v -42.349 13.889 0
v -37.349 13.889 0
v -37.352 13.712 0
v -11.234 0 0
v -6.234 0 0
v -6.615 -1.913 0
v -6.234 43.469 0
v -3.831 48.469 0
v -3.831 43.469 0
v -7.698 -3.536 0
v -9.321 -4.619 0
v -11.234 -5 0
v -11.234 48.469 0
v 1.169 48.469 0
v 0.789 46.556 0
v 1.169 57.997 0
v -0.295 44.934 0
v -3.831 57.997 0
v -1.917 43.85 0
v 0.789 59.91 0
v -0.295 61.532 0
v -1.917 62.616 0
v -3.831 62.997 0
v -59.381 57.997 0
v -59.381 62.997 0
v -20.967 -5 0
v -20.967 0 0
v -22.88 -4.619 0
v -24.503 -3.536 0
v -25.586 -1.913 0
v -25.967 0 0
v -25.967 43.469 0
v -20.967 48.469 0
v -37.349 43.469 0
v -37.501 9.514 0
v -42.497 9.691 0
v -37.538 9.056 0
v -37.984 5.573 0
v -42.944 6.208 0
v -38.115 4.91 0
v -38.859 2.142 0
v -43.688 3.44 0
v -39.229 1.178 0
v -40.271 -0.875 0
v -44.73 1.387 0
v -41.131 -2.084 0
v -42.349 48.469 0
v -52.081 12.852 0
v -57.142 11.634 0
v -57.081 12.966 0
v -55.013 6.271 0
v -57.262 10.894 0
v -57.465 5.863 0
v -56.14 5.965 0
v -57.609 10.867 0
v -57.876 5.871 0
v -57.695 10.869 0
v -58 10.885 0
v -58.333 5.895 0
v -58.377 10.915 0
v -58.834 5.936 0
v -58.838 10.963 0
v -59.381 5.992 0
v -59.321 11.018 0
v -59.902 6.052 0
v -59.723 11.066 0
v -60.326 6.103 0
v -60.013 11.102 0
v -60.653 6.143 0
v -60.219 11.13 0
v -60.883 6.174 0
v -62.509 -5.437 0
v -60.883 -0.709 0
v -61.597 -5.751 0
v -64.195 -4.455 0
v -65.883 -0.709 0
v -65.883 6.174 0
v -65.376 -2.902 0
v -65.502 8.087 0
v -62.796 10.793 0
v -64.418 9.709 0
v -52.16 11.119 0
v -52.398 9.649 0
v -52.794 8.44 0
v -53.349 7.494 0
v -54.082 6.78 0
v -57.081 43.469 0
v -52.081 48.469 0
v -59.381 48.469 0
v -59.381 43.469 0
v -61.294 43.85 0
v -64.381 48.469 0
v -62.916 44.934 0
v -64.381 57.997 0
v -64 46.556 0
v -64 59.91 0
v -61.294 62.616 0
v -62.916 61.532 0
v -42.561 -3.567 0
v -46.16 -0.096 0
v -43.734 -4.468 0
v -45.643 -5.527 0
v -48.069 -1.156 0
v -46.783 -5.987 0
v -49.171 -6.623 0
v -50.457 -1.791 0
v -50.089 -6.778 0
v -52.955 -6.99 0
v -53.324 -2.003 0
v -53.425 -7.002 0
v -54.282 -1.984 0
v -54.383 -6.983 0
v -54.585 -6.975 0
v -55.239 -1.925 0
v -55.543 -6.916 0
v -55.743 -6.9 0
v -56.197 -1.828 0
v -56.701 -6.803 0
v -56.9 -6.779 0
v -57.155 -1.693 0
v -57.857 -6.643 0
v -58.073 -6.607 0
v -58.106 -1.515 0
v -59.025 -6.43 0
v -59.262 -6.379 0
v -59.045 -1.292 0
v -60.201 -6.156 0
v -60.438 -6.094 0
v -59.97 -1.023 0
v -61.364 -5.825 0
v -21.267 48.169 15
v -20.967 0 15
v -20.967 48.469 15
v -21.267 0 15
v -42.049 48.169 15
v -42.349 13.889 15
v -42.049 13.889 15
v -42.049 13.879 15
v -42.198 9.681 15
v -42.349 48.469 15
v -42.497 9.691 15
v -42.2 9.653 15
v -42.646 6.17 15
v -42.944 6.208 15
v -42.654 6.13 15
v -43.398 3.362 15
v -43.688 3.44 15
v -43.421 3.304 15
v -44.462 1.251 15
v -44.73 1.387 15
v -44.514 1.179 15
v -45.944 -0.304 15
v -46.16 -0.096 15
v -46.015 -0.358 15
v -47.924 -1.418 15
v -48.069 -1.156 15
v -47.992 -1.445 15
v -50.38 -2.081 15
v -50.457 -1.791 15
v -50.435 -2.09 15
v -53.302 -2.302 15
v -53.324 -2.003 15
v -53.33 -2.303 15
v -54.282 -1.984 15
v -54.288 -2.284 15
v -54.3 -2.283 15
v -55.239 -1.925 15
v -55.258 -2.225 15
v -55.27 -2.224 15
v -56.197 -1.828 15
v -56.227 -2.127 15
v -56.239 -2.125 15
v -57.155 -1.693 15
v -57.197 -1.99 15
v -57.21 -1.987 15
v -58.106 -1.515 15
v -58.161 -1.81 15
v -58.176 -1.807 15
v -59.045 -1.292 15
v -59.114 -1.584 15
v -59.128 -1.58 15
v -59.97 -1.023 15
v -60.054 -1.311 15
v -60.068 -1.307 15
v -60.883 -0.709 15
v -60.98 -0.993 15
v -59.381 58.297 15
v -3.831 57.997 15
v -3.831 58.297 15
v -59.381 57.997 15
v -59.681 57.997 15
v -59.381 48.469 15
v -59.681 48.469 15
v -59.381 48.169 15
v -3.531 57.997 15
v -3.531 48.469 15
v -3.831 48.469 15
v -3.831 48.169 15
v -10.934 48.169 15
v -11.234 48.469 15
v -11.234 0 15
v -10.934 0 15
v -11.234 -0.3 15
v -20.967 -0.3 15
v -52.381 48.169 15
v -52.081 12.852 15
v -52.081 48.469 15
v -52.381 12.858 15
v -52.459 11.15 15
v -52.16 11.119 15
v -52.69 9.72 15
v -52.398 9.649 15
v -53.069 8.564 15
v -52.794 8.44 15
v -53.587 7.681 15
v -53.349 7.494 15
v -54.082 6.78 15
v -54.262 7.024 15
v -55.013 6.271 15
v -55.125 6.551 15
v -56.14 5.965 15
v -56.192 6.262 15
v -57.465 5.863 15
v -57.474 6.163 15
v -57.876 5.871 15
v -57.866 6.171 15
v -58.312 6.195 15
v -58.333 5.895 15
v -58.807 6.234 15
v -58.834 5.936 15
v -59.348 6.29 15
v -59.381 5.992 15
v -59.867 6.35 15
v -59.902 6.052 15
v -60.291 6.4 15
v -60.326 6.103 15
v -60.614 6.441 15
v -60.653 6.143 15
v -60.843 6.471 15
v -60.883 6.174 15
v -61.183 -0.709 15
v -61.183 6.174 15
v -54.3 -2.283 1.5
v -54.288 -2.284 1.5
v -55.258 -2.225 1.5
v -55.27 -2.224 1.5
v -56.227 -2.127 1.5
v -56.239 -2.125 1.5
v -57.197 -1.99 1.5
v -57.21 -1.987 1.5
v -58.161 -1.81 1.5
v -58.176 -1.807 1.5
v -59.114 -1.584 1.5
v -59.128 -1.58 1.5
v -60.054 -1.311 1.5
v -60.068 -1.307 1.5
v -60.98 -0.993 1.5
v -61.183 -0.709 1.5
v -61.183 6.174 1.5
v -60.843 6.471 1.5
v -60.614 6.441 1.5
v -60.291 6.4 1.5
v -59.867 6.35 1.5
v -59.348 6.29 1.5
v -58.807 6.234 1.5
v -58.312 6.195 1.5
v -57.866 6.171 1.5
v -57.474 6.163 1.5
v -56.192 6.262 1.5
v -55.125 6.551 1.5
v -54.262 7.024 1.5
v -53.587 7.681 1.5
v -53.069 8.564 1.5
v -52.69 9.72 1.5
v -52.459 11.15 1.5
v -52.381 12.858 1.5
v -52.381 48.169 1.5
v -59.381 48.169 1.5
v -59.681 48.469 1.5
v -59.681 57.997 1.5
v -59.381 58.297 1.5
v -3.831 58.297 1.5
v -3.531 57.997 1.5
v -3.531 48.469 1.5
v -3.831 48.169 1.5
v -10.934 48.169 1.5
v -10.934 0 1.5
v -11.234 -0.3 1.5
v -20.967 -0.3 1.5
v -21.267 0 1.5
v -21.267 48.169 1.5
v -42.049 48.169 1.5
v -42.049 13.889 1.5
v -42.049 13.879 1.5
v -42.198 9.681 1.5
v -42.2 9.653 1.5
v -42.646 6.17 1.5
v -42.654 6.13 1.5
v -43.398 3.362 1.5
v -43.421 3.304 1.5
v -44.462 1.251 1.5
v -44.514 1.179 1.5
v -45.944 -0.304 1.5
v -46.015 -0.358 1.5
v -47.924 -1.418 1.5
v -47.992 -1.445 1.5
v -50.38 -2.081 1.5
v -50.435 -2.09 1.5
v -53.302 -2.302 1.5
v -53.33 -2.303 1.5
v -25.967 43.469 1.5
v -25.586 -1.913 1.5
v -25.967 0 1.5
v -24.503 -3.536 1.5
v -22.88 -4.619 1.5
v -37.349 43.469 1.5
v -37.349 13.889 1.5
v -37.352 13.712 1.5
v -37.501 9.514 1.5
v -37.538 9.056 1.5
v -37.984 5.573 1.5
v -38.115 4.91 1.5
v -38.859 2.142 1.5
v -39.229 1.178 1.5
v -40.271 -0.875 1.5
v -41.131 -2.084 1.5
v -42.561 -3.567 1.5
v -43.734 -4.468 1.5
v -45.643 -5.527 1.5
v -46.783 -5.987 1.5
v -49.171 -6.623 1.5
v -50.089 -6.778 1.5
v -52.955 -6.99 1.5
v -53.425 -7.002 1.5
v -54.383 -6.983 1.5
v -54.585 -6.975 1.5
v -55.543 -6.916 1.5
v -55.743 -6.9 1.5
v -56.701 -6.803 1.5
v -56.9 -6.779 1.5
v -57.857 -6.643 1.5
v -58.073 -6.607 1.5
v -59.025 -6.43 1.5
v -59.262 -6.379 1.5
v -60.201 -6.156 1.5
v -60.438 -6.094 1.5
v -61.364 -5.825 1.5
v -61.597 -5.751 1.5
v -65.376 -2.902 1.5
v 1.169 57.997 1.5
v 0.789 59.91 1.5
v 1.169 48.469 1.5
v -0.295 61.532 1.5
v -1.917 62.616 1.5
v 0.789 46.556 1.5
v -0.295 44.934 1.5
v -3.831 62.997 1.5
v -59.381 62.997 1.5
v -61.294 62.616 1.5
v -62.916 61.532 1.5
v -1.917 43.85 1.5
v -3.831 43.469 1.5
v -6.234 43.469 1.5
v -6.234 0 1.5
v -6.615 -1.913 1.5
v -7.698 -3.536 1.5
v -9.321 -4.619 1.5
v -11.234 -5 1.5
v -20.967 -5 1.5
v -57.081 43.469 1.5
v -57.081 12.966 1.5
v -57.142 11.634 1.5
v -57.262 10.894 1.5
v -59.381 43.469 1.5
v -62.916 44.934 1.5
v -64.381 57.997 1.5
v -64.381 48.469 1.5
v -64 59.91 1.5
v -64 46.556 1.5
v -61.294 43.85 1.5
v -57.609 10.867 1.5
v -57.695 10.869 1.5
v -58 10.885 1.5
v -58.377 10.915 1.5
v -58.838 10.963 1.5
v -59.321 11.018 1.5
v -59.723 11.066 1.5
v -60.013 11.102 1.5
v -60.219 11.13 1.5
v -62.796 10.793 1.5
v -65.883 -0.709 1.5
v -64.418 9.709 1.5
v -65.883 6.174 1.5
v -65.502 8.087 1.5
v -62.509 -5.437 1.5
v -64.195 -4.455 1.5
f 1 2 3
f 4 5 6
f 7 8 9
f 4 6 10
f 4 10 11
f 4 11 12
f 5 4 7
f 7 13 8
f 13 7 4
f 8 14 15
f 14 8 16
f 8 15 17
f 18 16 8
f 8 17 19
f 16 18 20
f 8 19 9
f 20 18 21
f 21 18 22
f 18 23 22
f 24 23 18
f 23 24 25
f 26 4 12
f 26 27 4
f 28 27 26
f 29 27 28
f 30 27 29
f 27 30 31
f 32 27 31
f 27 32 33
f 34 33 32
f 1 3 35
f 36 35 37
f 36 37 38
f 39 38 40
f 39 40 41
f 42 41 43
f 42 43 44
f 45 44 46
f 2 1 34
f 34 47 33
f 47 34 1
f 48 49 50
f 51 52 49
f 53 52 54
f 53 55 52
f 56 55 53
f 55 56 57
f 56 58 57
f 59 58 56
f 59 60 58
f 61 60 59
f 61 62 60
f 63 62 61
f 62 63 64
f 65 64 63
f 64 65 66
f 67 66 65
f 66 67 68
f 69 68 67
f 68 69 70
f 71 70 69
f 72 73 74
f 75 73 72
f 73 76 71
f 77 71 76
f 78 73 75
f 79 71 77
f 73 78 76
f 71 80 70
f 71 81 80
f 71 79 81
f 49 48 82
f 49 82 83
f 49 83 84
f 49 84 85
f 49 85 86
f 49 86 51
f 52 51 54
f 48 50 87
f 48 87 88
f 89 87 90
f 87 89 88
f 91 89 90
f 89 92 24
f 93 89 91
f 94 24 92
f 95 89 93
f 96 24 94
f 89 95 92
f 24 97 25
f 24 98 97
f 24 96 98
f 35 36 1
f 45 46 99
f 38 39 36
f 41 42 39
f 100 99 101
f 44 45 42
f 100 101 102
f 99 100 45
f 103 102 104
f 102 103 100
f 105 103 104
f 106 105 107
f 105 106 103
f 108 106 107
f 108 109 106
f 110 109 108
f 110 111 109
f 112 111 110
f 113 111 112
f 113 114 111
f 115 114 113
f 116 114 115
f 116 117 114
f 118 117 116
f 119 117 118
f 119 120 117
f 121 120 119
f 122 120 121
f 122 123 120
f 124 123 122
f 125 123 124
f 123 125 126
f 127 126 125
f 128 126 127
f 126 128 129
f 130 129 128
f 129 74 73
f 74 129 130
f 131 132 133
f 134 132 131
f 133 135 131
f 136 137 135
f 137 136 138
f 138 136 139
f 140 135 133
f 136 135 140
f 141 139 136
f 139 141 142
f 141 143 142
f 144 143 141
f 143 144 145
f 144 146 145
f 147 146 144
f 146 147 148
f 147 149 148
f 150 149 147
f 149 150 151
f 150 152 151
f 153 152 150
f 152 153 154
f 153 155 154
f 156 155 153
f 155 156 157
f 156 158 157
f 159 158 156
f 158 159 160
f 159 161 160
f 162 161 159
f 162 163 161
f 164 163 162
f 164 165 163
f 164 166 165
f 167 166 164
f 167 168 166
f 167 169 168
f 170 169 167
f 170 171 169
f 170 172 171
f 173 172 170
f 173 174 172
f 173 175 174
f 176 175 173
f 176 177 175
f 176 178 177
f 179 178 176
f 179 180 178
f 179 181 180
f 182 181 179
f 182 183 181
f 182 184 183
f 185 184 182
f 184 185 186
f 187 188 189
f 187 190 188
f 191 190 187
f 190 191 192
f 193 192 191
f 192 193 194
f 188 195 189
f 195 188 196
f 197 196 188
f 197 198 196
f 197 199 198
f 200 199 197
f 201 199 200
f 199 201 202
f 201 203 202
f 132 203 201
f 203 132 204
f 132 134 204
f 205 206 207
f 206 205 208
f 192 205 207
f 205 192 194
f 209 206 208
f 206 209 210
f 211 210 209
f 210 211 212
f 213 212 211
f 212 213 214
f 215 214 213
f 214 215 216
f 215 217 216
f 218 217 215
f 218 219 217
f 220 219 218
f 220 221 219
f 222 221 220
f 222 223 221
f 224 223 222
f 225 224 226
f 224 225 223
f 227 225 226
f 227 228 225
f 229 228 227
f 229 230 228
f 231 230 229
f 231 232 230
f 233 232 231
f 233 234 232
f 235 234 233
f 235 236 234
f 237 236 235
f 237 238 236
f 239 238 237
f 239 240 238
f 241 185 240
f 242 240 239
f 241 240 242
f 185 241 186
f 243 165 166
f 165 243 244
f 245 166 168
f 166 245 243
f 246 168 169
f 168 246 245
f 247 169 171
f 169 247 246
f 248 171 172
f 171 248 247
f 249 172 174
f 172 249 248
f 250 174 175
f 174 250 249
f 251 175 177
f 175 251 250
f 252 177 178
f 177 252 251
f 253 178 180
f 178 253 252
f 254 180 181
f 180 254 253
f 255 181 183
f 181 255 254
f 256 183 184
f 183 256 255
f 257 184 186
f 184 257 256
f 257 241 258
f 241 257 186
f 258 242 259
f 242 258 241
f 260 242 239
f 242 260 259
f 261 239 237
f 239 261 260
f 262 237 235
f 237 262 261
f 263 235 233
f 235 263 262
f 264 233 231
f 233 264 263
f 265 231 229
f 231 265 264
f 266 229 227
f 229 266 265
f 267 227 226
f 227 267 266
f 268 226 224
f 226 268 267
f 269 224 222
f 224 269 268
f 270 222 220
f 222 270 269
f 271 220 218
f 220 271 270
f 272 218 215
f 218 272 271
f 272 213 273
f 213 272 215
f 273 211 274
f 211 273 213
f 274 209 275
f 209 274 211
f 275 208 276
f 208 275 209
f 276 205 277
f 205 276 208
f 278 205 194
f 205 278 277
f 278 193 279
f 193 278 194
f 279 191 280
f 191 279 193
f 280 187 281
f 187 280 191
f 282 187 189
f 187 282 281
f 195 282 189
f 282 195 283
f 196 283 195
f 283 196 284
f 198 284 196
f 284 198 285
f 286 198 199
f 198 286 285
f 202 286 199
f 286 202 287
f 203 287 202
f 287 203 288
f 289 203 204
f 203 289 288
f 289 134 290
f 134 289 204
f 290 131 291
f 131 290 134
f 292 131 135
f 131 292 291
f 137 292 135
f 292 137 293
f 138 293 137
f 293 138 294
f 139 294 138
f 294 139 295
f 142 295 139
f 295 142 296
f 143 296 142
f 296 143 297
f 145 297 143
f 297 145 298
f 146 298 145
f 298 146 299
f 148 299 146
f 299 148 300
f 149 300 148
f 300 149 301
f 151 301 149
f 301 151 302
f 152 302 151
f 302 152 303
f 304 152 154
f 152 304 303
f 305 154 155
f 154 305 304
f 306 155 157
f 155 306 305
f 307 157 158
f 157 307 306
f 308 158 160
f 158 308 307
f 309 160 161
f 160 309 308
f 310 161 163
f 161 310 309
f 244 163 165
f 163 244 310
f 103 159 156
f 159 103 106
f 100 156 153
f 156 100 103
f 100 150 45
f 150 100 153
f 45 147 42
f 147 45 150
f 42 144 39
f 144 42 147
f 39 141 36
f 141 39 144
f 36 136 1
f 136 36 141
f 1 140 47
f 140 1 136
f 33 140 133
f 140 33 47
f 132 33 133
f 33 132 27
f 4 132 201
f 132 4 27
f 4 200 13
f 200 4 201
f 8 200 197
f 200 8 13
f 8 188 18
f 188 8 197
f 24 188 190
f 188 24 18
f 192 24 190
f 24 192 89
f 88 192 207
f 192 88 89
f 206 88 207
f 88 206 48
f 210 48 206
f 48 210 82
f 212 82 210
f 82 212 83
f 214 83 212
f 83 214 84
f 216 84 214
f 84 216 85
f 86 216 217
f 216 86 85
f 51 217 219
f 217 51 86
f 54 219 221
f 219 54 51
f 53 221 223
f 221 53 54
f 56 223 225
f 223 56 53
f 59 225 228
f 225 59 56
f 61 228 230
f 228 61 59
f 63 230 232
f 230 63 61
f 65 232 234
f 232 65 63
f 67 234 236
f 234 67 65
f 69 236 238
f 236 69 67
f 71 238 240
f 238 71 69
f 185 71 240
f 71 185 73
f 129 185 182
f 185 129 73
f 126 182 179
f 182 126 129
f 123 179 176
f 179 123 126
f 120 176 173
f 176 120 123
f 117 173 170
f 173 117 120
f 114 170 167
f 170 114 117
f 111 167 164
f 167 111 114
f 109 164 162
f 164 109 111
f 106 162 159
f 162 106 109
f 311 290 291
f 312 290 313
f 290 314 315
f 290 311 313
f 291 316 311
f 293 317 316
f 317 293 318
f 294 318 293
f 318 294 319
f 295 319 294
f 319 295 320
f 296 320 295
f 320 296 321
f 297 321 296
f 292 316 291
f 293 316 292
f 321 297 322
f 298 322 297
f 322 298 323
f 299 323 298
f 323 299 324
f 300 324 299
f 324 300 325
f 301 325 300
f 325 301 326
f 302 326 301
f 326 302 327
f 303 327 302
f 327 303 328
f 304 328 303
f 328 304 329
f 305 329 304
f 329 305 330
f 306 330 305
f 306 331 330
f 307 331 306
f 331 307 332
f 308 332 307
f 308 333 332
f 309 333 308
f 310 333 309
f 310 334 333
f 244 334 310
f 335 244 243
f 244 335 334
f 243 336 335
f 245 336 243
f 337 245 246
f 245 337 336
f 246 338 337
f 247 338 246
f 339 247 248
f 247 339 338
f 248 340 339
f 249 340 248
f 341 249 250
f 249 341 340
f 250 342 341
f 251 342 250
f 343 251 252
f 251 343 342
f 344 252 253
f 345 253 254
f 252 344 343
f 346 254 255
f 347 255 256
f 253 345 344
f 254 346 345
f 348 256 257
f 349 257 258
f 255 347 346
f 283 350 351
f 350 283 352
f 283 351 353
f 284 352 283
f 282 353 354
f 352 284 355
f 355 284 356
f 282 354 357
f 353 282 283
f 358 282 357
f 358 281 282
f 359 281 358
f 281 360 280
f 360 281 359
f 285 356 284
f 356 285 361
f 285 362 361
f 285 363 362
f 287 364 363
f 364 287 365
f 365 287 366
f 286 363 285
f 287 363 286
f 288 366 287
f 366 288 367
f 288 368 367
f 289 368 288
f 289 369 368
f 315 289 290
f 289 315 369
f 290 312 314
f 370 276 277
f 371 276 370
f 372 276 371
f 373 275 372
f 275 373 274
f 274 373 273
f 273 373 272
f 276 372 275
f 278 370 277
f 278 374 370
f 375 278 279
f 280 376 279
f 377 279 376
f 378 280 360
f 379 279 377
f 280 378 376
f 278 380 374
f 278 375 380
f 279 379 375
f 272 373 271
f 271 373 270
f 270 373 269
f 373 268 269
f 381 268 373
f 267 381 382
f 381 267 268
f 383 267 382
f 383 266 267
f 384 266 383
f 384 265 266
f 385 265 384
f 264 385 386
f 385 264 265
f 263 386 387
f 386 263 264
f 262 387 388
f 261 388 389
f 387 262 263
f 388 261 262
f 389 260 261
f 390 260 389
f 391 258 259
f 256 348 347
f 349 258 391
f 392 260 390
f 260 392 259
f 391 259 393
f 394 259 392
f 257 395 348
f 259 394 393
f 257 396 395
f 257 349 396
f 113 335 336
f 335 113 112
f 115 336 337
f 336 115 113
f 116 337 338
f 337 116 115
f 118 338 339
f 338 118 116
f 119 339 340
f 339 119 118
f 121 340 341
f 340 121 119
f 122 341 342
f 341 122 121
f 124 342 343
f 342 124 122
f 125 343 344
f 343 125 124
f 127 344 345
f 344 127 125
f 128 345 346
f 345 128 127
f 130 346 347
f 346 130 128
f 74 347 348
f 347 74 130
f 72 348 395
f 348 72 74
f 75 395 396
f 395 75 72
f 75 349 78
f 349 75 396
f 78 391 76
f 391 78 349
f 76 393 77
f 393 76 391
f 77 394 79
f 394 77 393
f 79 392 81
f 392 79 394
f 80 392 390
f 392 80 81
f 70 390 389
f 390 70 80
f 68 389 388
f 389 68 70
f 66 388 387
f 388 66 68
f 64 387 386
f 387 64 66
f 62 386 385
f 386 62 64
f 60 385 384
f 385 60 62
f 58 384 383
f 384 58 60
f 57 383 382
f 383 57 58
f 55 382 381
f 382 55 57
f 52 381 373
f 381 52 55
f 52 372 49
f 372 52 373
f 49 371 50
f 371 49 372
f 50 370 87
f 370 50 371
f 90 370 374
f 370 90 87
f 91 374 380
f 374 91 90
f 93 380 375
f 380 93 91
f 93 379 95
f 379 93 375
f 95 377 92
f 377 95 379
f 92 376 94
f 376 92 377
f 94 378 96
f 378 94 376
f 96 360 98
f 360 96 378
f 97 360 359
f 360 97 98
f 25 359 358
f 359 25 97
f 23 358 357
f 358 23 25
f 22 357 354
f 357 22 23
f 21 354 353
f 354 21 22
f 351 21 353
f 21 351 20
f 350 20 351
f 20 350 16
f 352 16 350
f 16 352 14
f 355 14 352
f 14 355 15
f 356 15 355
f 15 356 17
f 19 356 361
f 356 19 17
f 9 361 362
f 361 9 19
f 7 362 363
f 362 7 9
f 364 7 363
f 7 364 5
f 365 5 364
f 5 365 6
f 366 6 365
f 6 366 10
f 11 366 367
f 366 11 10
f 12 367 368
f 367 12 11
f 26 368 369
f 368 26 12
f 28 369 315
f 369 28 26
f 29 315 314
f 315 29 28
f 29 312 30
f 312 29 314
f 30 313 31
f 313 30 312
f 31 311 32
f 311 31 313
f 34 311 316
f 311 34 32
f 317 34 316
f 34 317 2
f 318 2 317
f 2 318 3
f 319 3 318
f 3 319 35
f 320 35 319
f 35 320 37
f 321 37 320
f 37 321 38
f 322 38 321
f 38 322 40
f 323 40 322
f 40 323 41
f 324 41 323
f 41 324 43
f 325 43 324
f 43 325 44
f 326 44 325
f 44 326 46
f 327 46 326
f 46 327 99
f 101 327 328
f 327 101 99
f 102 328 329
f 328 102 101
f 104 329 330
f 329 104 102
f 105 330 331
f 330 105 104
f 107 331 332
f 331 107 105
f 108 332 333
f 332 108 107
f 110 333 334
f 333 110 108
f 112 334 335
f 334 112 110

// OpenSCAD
echo ("Copyright 2017 Nevit Dilmen");
echo ("Creative Commons Attribution Share Alike");

// Type here
Letter = "π";
// Extrusion
Extrude = 15;
// Size
Size = 60;
// Select the font you want. (visit google fonts site - fonts.google.com)
Select_Font = "Playfair Display"; //[ABeeZee,Abel,Abril Fatface,Aclonica,Acme,Actor,Adamina,Advent Pro,Aguafina Script,Akronim,Aladin,Aldrich,Alef,Alegreya,Alegreya Sans,Alegreya Sans SC,Alegreya SC,Alex Brush,Alfa Slab One,Alice,Alike,Alike Angular,Allan,Allerta,Allerta Stencil,Allura,Almendra,Almendra Display,Almendra SC,Amarante,Amaranth,Amatic SC,Amethysta,Amiri,Anaheim,Andada,Andika,Angkor,Annie Use Your Telescope,Anonymous Pro,Antic,Antic Didone,Antic Slab,Anton,Arapey,Arbutus,Arbutus Slab,Architects Daughter,Archivo Black,Archivo Narrow,Arimo,Arizonia,Armata,Artifika,Arvo,Asap,Asset,Astloch,Asul,Atomic Age,Aubrey,Audiowide,Autour One,Average,Average Sans,Averia Gruesa Libre,Averia Libre,Averia Sans Libre,Averia Serif Libre,Bad Script,Balthazar,Bangers,Basic,Battambang,Baumans,Bayon,Belgrano,Belleza,BenchNine,Bentham,Berkshire Swash,Bevan,Bigelow Rules,Bigshot One,Bilbo,Bilbo Swash Caps,Bitter,Black Ops One,Bokor,Bonbon,Boogaloo,Bowlby One,Bowlby One SC,Brawler,Bree Serif,Bubblegum Sans,Bubbler One,Buda,Buenard,Butcherman,Butterfly Kids,Cabin,Cabin Condensed,Cabin Sketch,Caesar Dressing,Cagliostro,Calligraffitti,Cambay,Cambo,Candal,Cantarell,Cantata One,Cantora One,Capriola,Cardo,Carme,Carrois Gothic,Carrois Gothic SC,Carter One,Caudex,Cedarville Cursive,Ceviche One,Changa One,Chango,Chau Philomene One,Chela One,Chelsea Market,Chenla,Cherry Cream Soda,Cherry Swash,Chewy,Chicle,Chivo,Cinzel,Cinzel Decorative,Clicker Script,Coda,Coda Caption,Codystar,Combo,Comfortaa,Coming Soon,Concert One,Condiment,Content,Contrail One,Convergence,Cookie,Copse,Corben,Courgette,Cousine,Coustard,Covered By Your Grace,Crafty Girls,Creepster,Crete Round,Crimson Text,Croissant One,Crushed,Cuprum,Cutive,Cutive Mono,Damion,Dancing Script,Dangrek,Dawning of a New Day,Days One,Dekko,Delius,Delius Swash Caps,Delius Unicase,Della Respira,Denk One,Devonshire,Dhurjati,Didact Gothic,Diplomata,Diplomata SC,Domine,Donegal One,Doppio One,Dorsa,Dosis,Dr Sugiyama,Droid Sans,Droid Sans Mono,Droid Serif,Duru Sans,Dynalight,Eagle Lake,Eater,EB Garamond,Economica,Ek Mukta,Electrolize,Elsie,Elsie Swash Caps,Emblema One,Emilys Candy,Engagement,Englebert,Enriqueta,Erica One,Esteban,Euphoria Script,Ewert,Exo,Exo 2,Expletus Sans,Fanwood Text,Fascinate,Fascinate Inline,Faster One,Fasthand,Fauna One,Federant,Federo,Felipa,Fenix,Finger Paint,Fira Mono,Fira Sans,Fjalla One,Fjord One,Flamenco,Flavors,Fondamento,Fontdiner Swanky,Forum,Francois One,Freckle Face,Fredericka the Great,Fredoka One,Freehand,Fresca,Frijole,Fruktur,Fugaz One,Gabriela,Gafata,Galdeano,Galindo,Gentium Basic,Gentium Book Basic,Geo,Geostar,Geostar Fill,Germania One,GFS Didot,GFS Neohellenic,Gidugu,Gilda Display,Give You Glory,Glass Antiqua,Glegoo,Gloria Hallelujah,Goblin One,Gochi Hand,Gorditas,Goudy Bookletter 1911,Graduate,Grand Hotel,Gravitas One,Great Vibes,Griffy,Gruppo,Gudea,Gurajada,Habibi,Halant,Hammersmith One,Hanalei,Hanalei Fill,Handlee,Hanuman,Happy Monkey,Headland One,Henny Penny,Herr Von Muellerhoff,Hind,Holtwood One SC,Homemade Apple,Homenaje,Iceberg,Iceland,IM Fell Double Pica,IM Fell Double Pica SC,IM Fell DW Pica,IM Fell DW Pica SC,IM Fell English,IM Fell English SC,IM Fell French Canon,IM Fell French Canon SC,IM Fell Great Primer,IM Fell Great Primer SC,Imprima,Inconsolata,Inder,Indie Flower,Inika,Irish Grover,Istok Web,Italiana,Italianno,Jacques Francois,Jacques Francois Shadow,Jim Nightshade,Jockey One,Jolly Lodger,Josefin Sans,Josefin Slab,Joti One,Judson,Julee,Julius Sans One,Junge,Jura,Just Another Hand,Just Me Again Down Here,Kalam,Kameron,Kantumruy,Karla,Karma,Kaushan Script,Kavoon,Kdam Thmor,Keania One,Kelly Slab,Kenia,Khand,Khmer,Khula,Kite One,Knewave,Kotta One,Koulen,Kranky,Kreon,Kristi,Krona One,La Belle Aurore,Laila,Lakki Reddy,Lancelot,Lateef,Lato,League Script,Leckerli One,Ledger,Lekton,Lemon,Liberation Sans,Libre Baskerville,Life Savers,Lilita One,Lily Script One,Limelight,Linden Hill,Lobster,Lobster Two,Londrina Outline,Londrina Shadow,Londrina Sketch,Londrina Solid,Lora,Love Ya Like A Sister,Loved by the King,Lovers Quarrel,Luckiest Guy,Lusitana,Lustria,Macondo,Macondo Swash Caps,Magra,Maiden Orange,Mako,Mallanna,Mandali,Marcellus,Marcellus SC,Marck Script,Margarine,Marko One,Marmelad,Martel Sans,Marvel,Mate,Mate SC,Maven Pro,McLaren,Meddon,MedievalSharp,Medula One,Megrim,Meie Script,Merienda,Merienda One,Merriweather,Merriweather Sans,Metal,Metal Mania,Metamorphous,Metrophobic,Michroma,Milonga,Miltonian,Miltonian Tattoo,Miniver,Miss Fajardose,Modak,Modern Antiqua,Molengo,Molle,Monda,Monofett,Monoton,Monsieur La Doulaise,Montaga,Montez,Montserrat,Montserrat Alternates,Montserrat Subrayada,Moul,Moulpali,Mountains of Christmas,Mouse Memoirs,Mr Bedfort,Mr Dafoe,Mr De Haviland,Mrs Saint Delafield,Mrs Sheppards,Muli,Mystery Quest,Neucha,Neuton,New Rocker,News Cycle,Niconne,Nixie One,Nobile,Nokora,Norican,Nosifer,Nothing You Could Do,Noticia Text,Noto Sans,Noto Serif,Nova Cut,Nova Flat,Nova Mono,Nova Oval,Nova Round,Nova Script,Nova Slim,Nova Square,NTR,Numans,Nunito,Odor Mean Chey,Offside,Old Standard TT,Oldenburg,Oleo Script,Oleo Script Swash Caps,Open Sans,Open Sans Condensed,Oranienbaum,Orbitron,Oregano,Orienta,Original Surfer,Oswald,Over the Rainbow,Overlock,Overlock SC,Ovo,Oxygen,Oxygen Mono,Pacifico,Paprika,Parisienne,Passero One,Passion One,Pathway Gothic One,Patrick Hand,Patrick Hand SC,Patua One,Paytone One,Peddana,Peralta,Permanent Marker,Petit Formal Script,Petrona,Philosopher,Piedra,Pinyon Script,Pirata One,Plaster,Play,Playball,Playfair Display,Playfair Display SC,Podkova,Poiret One,Poller One,Poly,Pompiere,Pontano Sans,Port Lligat Sans,Port Lligat Slab,Prata,Preahvihear,Press Start 2P,Princess Sofia,Prociono,Prosto One,PT Mono,PT Sans,PT Sans Caption,PT Sans Narrow,PT Serif,PT Serif Caption,Puritan,Purple Purse,Quando,Quantico,Quattrocento,Quattrocento Sans,Questrial,Quicksand,Quintessential,Qwigley,Racing Sans One,Radley,Rajdhani,Raleway,Raleway Dots,Ramabhadra,Ramaraja,Rambla,Rammetto One,Ranchers,Rancho,Ranga,Rationale,Ravi Prakash,Redressed,Reenie Beanie,Revalia,Ribeye,Ribeye Marrow,Righteous,Risque,Roboto,Roboto Condensed,Roboto Slab,Rochester,Rock Salt,Rokkitt,Romanesco,Ropa Sans,Rosario,Rosarivo,Rouge Script,Rozha One,Rubik Mono One,Rubik One,Ruda,Rufina,Ruge Boogie,Ruluko,Rum Raisin,Ruslan Display,Russo One,Ruthie,Rye,Sacramento,Sail,Salsa,Sanchez,Sancreek,Sansita One,Sarina,Sarpanch,Satisfy,Scada,Scheherazade,Schoolbell,Seaweed Script,Sevillana,Seymour One,Shadows Into Light,Shadows Into Light Two,Shanti,Share,Share Tech,Share Tech Mono,Shojumaru,Short Stack,Siemreap,Sigmar One,Signika,Signika Negative,Simonetta,Sintony,Sirin Stencil,Six Caps,Skranji,Slabo 13px,Slabo 27px,Slackey,Smokum,Smythe,Sniglet,Snippet,Snowburst One,Sofadi One,Sofia,Sonsie One,Sorts Mill Goudy,Source Code Pro,Source Sans Pro,Source Serif Pro,Special Elite,Spicy Rice,Spinnaker,Spirax,Squada One,Sree Krushnadevaraya,Stalemate,Stalinist One,Stardos Stencil,Stint Ultra Condensed,Stint Ultra Expanded,Stoke,Strait,Sue Ellen Francisco,Sunshiney,Supermercado One,Suranna,Suravaram,Suwannaphum,Swanky and Moo Moo,Syncopate,Tangerine,Taprom,Tauri,Teko,Telex,Tenali Ramakrishna,Tenor Sans,Text Me One,The Girl Next Door,Tienne,Timmana,Tinos,Titan One,Titillium Web,Trade Winds,Trocchi,Trochut,Trykker,Tulpen One,Ubuntu,Ubuntu Condensed,Ubuntu Mono,Ultra,Uncial Antiqua,Underdog,Unica One,UnifrakturCook,UnifrakturMaguntia,Unkempt,Unlock,Unna,Vampiro One,Varela,Varela Round,Vast Shadow,Vesper Libre,Vibur,Vidaloka,Viga,Voces,Volkhov,Vollkorn,Voltaire,VT323,Waiting for the Sunrise,Wallpoet,Walter Turncoat,Warnes,Wellfleet,Wendy One,Wire One,Yanone Kaffeesatz,Yellowtail,Yeseva One,Yesteryear,Zeyada]


mirror ([1,0,0]) {
linear_extrude (Extrude){
difference () {
offset (0.3)
resize([0,Size,0], auto=true) 
text (Letter, font=Select_Font, ":style=bold");
resize([0,Size,0], auto=true) 
text (Letter, font=Select_Font,":style=bold");
}}

linear_extrude (1.5){
difference () {
offset (5)
resize([0,Size,0], auto=true) 
text (Letter, font=Select_Font,":style=bold");
resize([0,Size,0], auto=true) 
text (Letter, font=Select_Font,":style=bold");
}
}
}
